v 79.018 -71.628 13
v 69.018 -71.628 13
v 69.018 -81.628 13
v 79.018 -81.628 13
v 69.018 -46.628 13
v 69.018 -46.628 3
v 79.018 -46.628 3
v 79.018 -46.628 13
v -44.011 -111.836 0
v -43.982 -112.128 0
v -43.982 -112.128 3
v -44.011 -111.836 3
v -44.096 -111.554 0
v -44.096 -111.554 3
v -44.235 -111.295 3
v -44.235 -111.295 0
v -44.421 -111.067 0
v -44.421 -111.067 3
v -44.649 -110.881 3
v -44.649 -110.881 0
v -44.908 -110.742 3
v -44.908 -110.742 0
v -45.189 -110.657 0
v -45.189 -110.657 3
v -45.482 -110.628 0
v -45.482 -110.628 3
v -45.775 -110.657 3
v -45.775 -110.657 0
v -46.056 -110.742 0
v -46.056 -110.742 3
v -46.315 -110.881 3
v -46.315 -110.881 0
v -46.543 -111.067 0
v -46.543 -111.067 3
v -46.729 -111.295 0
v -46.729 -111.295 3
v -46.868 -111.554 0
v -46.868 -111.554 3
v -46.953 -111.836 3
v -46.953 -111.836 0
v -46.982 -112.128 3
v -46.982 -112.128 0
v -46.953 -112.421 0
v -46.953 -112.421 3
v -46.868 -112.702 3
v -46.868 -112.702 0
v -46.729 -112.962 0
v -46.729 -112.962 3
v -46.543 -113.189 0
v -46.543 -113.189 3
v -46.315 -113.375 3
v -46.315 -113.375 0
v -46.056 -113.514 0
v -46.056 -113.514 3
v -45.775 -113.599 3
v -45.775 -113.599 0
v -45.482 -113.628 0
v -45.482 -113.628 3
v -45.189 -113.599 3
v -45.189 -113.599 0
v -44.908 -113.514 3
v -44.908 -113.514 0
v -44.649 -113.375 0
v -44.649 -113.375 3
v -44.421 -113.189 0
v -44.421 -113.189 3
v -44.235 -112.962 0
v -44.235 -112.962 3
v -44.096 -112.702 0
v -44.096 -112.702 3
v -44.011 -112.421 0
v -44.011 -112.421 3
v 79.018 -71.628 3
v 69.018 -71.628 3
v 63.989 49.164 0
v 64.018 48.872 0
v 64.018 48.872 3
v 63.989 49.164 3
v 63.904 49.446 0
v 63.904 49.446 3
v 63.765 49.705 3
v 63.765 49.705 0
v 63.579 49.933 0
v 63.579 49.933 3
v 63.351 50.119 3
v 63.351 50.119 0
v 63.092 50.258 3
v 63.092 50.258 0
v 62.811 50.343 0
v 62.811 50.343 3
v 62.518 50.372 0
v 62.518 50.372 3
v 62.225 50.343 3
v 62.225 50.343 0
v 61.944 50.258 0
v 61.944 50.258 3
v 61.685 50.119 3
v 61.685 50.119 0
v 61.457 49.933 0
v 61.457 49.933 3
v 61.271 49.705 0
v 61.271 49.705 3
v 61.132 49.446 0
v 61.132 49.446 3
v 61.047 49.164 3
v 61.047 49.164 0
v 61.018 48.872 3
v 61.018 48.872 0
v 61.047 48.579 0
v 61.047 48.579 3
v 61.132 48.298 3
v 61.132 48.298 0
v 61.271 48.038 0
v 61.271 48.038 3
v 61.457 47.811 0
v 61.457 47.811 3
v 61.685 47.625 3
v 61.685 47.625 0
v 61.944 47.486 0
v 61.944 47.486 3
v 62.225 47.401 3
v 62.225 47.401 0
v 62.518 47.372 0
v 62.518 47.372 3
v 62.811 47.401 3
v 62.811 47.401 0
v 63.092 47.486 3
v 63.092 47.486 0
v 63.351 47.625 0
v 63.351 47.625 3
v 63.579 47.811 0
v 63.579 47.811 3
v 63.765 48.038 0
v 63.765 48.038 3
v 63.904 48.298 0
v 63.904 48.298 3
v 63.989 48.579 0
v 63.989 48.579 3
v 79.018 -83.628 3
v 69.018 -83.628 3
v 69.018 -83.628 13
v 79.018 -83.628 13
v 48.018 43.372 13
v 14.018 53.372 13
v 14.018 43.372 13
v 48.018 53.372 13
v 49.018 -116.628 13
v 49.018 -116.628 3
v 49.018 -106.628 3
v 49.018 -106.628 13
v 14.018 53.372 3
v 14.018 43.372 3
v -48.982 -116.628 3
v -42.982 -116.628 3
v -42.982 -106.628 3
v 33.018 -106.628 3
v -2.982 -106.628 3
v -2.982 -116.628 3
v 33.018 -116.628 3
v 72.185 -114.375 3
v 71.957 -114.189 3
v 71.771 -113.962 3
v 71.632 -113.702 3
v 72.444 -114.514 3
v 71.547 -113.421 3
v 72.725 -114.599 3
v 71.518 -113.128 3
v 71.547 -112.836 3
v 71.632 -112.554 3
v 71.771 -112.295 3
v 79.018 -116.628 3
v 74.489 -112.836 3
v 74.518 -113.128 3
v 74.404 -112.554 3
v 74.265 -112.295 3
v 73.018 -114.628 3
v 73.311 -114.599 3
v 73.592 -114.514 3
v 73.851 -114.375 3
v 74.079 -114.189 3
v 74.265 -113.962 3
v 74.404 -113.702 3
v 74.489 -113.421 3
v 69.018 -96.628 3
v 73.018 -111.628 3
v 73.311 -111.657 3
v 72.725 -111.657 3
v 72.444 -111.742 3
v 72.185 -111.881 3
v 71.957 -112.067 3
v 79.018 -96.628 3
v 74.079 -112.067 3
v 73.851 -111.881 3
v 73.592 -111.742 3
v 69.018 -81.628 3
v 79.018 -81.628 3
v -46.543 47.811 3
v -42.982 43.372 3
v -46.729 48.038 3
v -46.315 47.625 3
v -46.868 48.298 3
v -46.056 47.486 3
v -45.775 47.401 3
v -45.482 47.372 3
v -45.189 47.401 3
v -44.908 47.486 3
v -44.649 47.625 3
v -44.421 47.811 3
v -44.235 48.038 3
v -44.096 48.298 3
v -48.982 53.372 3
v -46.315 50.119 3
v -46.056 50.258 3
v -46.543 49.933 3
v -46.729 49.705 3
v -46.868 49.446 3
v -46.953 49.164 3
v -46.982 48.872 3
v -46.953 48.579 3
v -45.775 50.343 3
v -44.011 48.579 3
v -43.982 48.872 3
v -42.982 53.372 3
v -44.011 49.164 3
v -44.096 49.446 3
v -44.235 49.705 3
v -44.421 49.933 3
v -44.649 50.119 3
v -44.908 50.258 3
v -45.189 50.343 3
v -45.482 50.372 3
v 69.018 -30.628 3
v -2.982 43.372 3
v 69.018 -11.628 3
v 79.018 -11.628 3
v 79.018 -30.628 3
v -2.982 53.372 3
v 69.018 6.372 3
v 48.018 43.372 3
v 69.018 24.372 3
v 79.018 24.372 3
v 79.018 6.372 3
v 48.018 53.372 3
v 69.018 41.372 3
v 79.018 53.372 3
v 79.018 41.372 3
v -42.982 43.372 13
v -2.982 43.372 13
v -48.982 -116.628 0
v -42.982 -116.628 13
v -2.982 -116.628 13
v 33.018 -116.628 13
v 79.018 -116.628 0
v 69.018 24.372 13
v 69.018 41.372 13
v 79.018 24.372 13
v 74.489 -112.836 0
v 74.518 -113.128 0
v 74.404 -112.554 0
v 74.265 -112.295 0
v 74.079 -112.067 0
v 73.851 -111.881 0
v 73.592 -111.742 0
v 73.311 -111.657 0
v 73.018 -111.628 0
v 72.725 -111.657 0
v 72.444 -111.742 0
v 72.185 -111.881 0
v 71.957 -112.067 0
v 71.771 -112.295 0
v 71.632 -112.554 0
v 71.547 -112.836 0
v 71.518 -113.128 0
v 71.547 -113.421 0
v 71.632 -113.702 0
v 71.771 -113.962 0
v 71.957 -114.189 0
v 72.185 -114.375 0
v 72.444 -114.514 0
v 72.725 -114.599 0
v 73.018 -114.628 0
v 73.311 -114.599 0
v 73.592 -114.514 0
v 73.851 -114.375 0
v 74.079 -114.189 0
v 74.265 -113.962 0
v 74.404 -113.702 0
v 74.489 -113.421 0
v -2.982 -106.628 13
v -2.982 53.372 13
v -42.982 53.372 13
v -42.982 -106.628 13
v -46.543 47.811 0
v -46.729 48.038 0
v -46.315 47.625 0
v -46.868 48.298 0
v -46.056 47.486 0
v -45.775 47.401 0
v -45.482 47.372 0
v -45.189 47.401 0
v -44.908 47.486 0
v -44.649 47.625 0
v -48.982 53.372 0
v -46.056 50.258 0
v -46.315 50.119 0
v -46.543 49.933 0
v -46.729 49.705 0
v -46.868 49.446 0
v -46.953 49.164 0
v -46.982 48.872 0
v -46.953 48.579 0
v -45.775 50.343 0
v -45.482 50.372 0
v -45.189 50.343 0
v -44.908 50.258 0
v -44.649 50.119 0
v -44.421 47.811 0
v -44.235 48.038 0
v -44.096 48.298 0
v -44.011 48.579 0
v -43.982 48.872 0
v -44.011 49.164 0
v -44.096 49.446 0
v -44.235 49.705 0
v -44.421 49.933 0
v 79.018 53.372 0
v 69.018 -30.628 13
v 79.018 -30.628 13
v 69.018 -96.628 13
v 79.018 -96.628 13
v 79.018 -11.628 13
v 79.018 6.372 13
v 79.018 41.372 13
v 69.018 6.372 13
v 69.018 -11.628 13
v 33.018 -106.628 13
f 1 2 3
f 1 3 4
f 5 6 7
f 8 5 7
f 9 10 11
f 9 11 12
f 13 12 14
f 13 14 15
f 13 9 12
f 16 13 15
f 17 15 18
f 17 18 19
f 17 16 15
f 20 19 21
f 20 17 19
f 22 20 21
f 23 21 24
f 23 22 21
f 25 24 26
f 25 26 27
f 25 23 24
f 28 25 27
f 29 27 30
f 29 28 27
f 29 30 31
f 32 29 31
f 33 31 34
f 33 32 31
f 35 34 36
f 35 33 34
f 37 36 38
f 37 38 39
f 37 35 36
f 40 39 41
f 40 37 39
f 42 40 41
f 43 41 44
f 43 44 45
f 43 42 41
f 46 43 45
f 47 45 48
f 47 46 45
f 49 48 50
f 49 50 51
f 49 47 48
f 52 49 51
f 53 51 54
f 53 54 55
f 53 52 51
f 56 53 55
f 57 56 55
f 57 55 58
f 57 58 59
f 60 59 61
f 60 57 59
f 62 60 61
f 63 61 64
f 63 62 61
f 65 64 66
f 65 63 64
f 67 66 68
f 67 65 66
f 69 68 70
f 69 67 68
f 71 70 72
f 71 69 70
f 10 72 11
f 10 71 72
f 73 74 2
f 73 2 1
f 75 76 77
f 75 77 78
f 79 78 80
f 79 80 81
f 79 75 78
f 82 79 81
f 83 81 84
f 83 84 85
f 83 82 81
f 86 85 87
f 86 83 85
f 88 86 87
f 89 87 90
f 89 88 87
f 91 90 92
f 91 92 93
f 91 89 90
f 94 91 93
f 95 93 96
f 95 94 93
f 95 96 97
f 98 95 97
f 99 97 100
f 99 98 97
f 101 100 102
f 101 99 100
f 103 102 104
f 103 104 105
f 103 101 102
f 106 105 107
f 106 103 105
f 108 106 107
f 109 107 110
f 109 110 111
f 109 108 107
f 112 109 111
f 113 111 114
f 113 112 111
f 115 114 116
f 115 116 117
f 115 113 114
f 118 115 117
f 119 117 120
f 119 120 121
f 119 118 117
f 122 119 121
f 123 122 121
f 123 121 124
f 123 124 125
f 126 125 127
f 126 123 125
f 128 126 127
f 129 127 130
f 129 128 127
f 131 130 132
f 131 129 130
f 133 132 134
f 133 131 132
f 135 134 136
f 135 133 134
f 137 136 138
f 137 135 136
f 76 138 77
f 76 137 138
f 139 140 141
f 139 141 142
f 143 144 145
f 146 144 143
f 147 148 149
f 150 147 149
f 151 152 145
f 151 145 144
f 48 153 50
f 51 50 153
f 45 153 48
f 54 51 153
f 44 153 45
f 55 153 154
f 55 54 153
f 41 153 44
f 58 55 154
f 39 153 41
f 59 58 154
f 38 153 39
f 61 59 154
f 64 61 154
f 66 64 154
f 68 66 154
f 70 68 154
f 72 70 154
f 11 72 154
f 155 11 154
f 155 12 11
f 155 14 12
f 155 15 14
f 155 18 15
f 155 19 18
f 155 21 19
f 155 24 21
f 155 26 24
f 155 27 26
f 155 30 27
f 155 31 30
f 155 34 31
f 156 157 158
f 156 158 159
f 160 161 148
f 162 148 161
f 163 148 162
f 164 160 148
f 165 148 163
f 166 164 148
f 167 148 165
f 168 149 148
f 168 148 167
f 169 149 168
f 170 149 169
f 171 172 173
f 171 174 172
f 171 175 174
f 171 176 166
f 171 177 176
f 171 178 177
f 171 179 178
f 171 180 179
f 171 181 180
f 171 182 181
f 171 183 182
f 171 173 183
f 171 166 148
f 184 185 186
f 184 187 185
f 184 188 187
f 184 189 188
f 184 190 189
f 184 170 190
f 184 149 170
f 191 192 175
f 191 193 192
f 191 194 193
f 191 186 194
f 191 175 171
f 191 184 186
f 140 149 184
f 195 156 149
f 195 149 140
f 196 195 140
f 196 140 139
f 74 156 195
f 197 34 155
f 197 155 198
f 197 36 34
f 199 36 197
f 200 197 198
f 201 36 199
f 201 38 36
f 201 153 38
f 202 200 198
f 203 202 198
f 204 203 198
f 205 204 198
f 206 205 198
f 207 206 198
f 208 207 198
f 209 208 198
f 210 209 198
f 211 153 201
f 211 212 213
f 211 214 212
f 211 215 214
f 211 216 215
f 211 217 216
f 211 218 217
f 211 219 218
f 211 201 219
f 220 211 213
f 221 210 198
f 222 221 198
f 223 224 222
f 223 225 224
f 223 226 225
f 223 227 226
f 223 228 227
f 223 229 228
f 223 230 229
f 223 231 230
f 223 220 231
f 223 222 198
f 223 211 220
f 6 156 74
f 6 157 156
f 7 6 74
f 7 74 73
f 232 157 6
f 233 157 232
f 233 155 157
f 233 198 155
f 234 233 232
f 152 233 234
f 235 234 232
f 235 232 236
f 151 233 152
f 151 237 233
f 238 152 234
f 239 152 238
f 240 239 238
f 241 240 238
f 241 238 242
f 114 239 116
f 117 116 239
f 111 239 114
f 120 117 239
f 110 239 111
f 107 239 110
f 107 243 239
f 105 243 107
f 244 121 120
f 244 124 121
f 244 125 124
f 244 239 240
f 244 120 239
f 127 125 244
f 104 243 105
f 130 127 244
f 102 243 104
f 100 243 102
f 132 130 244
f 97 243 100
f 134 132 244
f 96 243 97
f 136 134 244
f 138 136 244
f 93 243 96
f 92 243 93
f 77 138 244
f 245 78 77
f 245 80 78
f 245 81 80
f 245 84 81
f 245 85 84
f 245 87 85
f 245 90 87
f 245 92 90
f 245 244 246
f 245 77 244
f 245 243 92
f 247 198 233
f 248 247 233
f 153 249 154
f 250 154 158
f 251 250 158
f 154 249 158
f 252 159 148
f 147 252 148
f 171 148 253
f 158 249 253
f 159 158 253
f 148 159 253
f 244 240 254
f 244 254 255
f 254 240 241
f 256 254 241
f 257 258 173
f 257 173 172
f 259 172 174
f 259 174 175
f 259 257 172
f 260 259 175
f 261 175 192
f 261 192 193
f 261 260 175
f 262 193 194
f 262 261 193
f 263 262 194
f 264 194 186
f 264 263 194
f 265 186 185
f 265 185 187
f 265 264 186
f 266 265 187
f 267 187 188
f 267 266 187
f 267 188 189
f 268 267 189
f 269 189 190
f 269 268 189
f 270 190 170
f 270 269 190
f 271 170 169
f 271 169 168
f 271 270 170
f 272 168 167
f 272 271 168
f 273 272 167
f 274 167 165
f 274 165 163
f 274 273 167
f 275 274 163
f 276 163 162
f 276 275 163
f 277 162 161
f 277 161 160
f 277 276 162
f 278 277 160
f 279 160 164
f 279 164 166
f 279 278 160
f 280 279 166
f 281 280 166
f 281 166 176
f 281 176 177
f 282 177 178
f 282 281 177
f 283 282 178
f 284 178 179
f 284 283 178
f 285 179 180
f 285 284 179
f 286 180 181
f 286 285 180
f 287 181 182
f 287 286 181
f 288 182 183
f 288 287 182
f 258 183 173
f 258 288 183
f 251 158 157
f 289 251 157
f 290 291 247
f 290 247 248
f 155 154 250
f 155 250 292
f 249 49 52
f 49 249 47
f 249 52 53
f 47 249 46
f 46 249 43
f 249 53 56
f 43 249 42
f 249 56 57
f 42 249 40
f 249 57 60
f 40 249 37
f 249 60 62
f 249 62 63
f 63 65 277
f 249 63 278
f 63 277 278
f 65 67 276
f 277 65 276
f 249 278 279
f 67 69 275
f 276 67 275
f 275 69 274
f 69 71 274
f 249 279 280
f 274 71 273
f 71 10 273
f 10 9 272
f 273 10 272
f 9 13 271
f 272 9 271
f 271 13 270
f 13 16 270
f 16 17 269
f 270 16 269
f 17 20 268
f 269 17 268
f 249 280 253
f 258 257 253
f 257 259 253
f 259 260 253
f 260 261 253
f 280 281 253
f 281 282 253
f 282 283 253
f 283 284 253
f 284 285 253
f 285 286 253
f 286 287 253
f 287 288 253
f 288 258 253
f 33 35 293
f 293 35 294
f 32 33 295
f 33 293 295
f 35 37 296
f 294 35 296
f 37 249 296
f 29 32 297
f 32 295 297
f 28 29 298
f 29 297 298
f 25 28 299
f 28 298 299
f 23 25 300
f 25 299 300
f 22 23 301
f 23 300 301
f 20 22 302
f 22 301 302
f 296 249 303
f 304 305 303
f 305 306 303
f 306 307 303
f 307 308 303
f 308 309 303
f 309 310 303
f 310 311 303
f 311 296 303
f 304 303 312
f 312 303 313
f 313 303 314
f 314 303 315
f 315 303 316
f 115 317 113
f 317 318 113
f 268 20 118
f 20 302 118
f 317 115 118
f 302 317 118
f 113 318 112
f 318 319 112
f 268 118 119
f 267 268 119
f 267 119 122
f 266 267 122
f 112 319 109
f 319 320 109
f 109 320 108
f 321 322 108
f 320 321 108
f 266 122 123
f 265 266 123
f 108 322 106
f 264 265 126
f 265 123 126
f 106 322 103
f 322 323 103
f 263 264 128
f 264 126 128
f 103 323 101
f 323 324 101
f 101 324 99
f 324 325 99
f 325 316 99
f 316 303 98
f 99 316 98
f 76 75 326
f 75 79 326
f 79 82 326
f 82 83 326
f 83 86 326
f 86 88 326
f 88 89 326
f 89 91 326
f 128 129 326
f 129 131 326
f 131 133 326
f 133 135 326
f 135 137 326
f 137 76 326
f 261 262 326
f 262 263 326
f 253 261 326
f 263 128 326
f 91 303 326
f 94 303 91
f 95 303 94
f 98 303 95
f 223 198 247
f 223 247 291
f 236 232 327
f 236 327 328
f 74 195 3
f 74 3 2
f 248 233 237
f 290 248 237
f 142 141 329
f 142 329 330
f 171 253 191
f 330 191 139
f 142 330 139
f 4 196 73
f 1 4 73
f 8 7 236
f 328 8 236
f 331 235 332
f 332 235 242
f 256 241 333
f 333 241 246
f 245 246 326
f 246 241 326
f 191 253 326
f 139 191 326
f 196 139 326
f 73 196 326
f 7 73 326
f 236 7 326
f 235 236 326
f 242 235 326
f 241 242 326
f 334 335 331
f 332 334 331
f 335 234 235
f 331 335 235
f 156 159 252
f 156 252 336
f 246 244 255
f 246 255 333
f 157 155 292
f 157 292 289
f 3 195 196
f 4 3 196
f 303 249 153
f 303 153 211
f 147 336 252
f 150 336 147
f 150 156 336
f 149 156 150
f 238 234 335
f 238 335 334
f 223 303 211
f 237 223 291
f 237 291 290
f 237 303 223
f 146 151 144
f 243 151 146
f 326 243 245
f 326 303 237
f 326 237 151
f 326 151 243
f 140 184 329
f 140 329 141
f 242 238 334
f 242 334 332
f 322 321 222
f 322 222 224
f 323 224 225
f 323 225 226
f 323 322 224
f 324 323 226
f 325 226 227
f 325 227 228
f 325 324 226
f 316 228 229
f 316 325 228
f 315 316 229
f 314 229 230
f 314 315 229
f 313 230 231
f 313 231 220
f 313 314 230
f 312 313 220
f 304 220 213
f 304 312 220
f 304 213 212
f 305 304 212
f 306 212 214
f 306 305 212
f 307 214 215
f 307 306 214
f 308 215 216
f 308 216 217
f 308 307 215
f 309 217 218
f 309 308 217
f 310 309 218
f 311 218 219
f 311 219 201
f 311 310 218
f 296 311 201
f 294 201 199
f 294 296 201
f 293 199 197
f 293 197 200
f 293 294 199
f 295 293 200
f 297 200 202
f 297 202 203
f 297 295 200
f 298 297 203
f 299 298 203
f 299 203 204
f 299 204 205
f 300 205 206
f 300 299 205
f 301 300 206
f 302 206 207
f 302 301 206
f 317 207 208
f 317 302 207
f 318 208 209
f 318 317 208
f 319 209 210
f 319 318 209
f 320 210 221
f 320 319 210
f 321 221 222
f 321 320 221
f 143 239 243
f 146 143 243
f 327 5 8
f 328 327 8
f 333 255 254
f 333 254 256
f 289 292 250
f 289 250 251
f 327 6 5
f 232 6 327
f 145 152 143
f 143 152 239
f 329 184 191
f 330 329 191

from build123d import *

# Parameters (mm, degrees)
SKETCH_1_W      = 128
SKETCH_1_H      = 170
SKETCH_1_R      = 1.5
EXTRUDE_1_DEPTH = 3
SKETCH_2_W      = 40
SKETCH_2_H      = 10
SKETCH_2_W_2    = 16
SKETCH_2_W_3    = 10
SKETCH_2_H_2    = 13
SKETCH_2_H_3    = 16
SKETCH_2_H_4    = 18
SKETCH_2_H_5    = 17
SKETCH_2_W_4    = 34
EXTRUDE_2_DEPTH = 10


with BuildPart() as part:
    # 草圖1 → 填料-伸長1 (new body)
    with BuildSketch(Plane.XY):
        with Locations((15.018050542, -31.628158845)):
            Rectangle(SKETCH_1_W, SKETCH_1_H)
        with Locations((-45.481949458, 48.871841155)):
            Circle(SKETCH_1_R, mode=Mode.SUBTRACT)
        with Locations((-45.481949458, -112.128158845)):
            Circle(SKETCH_1_R, mode=Mode.SUBTRACT)
        with Locations((73.018050542, -113.128158845)):
            Circle(SKETCH_1_R, mode=Mode.SUBTRACT)
        with Locations((62.518050542, 48.871841155)):
            Circle(SKETCH_1_R, mode=Mode.SUBTRACT)
    extrude(amount=EXTRUDE_1_DEPTH)

    # 草圖2 → 填料-伸長2 (add)
    with BuildSketch(Plane.XY.offset(3)):
        with Locations((-22.981949458, -111.628158845)):
            Rectangle(SKETCH_2_W, SKETCH_2_H)
        with Locations((41.018050542, -111.628158845)):
            Rectangle(SKETCH_2_W_2, SKETCH_2_H)
        with Locations((74.018050542, -90.128158845)):
            Rectangle(SKETCH_2_W_3, SKETCH_2_H_2)
        with Locations((74.018050542, -76.628158845)):
            Rectangle(SKETCH_2_W_3, SKETCH_2_H)
        with Locations((74.018050542, -38.628158845)):
            Rectangle(SKETCH_2_W_3, SKETCH_2_H_3)
        with Locations((74.018050542, -2.628158845)):
            Rectangle(SKETCH_2_W_3, SKETCH_2_H_4)
        with Locations((74.018050542, 32.871841155)):
            Rectangle(SKETCH_2_W_3, SKETCH_2_H_5)
        with Locations((31.018050542, 48.371841155)):
            Rectangle(SKETCH_2_W_4, SKETCH_2_H)
        with Locations((-22.981949458, 48.371841155)):
            Rectangle(SKETCH_2_W, SKETCH_2_H)
    extrude(amount=EXTRUDE_2_DEPTH)


solid = part.part
